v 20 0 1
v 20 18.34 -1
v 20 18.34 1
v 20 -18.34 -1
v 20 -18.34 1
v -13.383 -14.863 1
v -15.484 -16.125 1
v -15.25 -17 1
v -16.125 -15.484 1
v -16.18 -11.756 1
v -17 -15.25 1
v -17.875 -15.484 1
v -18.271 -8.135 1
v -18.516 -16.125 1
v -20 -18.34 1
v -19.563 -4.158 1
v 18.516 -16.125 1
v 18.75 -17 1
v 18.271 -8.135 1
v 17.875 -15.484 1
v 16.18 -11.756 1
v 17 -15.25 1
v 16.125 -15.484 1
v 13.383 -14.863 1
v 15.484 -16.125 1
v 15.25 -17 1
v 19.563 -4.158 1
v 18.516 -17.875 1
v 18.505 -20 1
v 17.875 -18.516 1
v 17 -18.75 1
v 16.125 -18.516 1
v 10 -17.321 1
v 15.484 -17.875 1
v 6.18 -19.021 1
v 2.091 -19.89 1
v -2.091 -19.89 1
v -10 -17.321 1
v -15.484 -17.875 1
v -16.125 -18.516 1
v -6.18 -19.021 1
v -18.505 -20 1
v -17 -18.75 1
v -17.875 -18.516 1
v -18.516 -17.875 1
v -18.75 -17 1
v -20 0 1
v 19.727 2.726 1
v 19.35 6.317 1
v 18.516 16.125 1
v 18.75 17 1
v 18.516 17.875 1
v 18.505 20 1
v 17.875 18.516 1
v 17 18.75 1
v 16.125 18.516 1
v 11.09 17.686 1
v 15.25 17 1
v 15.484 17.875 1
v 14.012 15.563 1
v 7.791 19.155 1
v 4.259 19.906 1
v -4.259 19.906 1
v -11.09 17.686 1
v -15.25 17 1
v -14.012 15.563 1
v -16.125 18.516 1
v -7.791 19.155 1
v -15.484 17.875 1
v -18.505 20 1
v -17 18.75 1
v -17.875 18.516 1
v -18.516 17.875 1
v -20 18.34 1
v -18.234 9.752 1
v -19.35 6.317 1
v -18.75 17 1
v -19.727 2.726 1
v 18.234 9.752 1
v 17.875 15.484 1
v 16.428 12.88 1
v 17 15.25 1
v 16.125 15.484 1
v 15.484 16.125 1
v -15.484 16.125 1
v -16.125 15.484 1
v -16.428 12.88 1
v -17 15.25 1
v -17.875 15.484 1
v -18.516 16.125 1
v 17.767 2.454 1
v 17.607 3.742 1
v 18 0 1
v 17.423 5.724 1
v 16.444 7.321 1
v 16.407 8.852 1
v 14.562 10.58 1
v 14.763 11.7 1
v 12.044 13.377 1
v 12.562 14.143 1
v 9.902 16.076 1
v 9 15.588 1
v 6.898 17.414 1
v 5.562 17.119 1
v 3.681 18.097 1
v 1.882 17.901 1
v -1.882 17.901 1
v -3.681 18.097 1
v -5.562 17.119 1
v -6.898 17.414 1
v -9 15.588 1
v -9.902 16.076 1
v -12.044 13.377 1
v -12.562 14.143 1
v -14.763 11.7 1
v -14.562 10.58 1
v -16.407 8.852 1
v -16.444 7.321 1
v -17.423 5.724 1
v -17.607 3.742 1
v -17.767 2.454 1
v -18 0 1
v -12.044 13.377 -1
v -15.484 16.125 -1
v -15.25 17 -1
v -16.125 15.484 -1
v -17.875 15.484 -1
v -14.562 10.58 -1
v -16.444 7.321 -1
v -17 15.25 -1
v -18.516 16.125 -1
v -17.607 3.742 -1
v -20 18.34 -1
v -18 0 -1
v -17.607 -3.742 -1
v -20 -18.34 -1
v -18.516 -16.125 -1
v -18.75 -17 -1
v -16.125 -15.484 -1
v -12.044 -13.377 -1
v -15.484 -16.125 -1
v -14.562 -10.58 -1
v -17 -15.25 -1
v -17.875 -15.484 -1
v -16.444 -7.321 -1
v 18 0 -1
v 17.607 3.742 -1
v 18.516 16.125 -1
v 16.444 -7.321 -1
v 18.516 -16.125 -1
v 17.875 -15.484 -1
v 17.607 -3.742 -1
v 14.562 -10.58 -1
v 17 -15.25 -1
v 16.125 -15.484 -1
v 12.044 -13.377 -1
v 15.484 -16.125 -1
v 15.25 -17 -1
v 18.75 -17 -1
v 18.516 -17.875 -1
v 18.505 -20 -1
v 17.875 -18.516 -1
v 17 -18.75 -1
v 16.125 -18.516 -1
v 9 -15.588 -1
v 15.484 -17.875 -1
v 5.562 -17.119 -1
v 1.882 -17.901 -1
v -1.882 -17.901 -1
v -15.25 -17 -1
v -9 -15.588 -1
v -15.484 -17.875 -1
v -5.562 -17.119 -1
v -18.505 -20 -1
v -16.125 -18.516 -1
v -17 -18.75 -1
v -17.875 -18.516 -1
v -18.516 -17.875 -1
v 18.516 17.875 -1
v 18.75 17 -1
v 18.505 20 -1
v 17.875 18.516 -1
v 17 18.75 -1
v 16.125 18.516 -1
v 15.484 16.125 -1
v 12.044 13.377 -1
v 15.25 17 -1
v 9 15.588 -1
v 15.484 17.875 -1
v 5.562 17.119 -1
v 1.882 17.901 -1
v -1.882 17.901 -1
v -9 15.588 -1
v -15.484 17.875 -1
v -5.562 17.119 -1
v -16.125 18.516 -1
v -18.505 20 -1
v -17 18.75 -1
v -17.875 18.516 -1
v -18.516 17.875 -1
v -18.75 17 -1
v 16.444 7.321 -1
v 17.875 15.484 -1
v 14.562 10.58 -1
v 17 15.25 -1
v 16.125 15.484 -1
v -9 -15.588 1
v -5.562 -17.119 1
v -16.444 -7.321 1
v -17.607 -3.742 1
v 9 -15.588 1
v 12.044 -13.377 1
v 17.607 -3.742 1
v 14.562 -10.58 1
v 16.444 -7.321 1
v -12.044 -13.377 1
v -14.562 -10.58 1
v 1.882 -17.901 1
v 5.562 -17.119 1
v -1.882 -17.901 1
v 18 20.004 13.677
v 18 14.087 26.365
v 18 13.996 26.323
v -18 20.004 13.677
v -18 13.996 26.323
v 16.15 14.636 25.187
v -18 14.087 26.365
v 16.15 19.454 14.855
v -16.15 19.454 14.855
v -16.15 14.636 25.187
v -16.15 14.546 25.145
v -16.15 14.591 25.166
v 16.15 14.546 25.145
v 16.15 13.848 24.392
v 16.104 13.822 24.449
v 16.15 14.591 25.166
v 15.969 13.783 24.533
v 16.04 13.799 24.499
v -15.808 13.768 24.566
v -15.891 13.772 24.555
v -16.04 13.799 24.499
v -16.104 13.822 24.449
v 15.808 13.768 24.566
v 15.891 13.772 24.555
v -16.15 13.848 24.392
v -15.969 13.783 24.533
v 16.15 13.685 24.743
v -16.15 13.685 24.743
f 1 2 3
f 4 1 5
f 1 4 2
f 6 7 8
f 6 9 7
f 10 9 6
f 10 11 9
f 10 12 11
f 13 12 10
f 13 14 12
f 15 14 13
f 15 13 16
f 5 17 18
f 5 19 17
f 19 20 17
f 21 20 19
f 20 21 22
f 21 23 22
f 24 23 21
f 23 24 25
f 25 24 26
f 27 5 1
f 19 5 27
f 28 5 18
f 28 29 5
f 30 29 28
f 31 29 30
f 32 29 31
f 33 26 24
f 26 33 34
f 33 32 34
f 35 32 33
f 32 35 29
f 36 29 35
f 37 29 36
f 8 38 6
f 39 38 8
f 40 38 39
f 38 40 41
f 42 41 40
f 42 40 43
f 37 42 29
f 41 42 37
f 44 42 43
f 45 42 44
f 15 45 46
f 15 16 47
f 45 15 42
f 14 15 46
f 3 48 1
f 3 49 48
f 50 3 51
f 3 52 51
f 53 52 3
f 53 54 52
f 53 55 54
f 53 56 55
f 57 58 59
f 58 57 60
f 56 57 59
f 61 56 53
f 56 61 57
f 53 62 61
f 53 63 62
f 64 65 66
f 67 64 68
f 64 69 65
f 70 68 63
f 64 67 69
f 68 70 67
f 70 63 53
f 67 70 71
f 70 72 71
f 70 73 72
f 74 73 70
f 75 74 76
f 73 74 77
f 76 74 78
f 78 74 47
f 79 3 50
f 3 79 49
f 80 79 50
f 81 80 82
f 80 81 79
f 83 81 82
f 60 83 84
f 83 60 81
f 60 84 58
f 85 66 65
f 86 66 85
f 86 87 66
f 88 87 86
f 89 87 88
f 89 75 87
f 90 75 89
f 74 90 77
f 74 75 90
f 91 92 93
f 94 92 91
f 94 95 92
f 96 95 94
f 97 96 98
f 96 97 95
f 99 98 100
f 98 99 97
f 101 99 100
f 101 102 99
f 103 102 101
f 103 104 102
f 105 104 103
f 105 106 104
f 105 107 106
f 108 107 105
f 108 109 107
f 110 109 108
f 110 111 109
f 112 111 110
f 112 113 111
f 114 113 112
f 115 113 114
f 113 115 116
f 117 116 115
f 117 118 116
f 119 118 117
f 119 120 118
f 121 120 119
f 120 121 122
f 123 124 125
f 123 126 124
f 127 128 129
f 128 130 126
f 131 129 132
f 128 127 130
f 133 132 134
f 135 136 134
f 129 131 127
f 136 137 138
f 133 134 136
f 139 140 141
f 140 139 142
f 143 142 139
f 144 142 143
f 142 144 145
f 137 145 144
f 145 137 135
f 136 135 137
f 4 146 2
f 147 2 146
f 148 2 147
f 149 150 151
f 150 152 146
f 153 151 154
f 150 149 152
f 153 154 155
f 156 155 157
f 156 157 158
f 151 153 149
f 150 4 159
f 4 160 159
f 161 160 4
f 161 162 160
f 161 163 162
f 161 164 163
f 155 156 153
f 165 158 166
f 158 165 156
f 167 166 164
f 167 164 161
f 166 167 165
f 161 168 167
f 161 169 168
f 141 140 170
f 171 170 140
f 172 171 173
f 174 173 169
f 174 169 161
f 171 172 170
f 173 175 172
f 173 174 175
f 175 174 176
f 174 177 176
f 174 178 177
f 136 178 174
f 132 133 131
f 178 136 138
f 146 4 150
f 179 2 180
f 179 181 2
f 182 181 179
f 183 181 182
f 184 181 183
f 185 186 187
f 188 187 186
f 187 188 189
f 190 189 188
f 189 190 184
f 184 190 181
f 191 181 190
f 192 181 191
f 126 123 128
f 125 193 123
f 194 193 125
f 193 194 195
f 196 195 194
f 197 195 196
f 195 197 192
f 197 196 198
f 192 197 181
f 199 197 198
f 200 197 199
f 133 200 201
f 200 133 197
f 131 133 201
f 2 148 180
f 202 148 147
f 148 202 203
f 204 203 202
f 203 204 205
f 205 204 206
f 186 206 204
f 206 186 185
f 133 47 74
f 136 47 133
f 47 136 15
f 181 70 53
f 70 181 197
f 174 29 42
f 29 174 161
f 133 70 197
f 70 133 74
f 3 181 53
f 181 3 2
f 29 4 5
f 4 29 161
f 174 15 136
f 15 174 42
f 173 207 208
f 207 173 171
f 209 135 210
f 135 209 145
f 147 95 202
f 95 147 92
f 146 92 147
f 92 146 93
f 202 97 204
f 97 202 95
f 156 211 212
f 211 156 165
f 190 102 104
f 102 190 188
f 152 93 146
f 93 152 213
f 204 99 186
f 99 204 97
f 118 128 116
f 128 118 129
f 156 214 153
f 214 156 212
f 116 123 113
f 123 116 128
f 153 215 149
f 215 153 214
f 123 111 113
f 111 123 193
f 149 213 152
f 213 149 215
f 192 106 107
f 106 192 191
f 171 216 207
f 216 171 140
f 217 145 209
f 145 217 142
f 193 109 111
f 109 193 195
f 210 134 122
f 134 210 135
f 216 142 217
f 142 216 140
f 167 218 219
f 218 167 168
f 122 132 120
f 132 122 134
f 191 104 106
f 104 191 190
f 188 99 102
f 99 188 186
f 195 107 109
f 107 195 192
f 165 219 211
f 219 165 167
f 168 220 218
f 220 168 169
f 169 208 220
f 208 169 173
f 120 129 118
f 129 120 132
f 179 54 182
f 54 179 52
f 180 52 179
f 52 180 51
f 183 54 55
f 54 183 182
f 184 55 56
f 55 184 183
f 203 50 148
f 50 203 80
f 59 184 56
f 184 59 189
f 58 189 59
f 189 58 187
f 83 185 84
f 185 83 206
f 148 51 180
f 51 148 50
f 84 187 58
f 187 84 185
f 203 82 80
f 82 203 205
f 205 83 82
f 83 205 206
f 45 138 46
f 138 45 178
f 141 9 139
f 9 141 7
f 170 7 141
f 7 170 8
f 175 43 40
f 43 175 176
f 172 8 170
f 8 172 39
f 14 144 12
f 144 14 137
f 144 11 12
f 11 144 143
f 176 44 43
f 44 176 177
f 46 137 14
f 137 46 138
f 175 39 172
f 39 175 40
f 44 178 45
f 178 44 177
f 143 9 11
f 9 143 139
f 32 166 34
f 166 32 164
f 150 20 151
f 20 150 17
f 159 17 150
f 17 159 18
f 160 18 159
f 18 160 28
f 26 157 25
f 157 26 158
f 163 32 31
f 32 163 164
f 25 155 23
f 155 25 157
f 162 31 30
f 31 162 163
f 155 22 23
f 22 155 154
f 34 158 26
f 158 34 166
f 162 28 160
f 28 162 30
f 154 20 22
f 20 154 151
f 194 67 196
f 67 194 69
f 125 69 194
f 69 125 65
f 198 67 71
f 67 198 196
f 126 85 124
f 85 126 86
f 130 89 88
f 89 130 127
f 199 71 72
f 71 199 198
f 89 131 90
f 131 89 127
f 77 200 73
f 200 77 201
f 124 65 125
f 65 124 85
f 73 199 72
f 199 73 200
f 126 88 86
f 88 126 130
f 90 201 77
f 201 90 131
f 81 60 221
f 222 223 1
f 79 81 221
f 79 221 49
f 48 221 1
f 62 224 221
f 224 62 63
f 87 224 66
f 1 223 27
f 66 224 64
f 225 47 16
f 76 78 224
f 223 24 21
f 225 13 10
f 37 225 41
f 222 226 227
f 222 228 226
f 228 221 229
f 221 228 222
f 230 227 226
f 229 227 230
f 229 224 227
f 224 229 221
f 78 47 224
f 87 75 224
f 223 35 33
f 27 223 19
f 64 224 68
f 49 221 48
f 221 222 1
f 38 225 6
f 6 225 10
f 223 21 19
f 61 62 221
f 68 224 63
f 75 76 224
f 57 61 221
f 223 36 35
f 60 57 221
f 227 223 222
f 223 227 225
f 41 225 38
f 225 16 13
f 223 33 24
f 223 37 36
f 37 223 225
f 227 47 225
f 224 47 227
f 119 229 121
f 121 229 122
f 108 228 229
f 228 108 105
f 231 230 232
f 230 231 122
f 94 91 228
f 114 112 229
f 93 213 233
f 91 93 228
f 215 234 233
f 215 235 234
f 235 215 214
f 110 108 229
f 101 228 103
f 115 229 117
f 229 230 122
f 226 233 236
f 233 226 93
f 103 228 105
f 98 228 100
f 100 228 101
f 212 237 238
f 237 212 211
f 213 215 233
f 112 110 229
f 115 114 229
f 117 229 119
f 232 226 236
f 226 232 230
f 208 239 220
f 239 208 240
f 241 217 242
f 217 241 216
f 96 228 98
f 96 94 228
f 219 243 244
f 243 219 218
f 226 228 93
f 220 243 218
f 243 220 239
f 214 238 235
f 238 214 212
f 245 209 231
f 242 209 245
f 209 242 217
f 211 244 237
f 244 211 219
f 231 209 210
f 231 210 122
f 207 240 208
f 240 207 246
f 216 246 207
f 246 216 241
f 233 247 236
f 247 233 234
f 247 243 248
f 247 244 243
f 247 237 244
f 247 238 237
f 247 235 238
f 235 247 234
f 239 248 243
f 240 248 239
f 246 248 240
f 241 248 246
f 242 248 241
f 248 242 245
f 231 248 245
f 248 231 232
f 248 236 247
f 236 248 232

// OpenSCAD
/* [Base] */

// Base height (mm)
base_height=2;

// Fan body size (mm)
fan_size=40;

// Diameter of the helice hole
fan_hole_diameter=40;



/* [Fixation] */

// Screw diameter (mm)
base_screw_diameter=3.5;

// Margin with border (mm)
base_screw_margin=3;



/* [Duct] */

// Duct shape
duct_shape = "squared"; // [rounded, squared, heart]

// Duct height
duct_height=20;

// Scale over X (% of fan_hole_diameter)
duct_width=.90;
// Scale over Y (% of fan_hole_diameter)
duct_length=.35;

// Hole orientation over X
duct_rotation_x=-65; // [-30:30]
// Hole orientation over Y
duct_rotation_y=0; // [-30:30]
// Hole orientation over Z
duct_rotation_z=0; // [-30:30]

// Distance from center X
duct_delta_x=0;
// Distance from center X
duct_delta_y=17;

// Border thickness
duct_border_width=2;



/* [Hidden] */

// Main Object

//difference() {
union() {
  base();
  duct();
}
/*translate([0, -100, -50])
cube([100, 100, 100]);
}*/

//translate([0, 0, 50]) _duct_top_form_heart();



// build the duct base
module base() {
  difference() {
    _base_form();
    _fan_hole_form(base_height+1, duct_border_width);
    _screw();
  }
}



module _screw() {
  $fn=12;
  // holes Position var
  s_hole=fan_size/2-base_screw_margin;

  translate([s_hole, s_hole, 0])
    cylinder(r=base_screw_diameter/2, h=base_height+2, center=true);
  translate([-s_hole, -s_hole, 0])
    cylinder(r=base_screw_diameter/2, h=base_height+2, center=true);
  translate([s_hole, -s_hole, 0])
    cylinder(r=base_screw_diameter/2, h=base_height+2, center=true);
  translate([-s_hole, s_hole, 0])
    cylinder(r=base_screw_diameter/2, h=base_height+2, center=true);
}



// build the duct
module duct() {
  difference() {
    // outter
    _duct();
    // inner
    _duct(duct_border_width);

    //top hole
      _duct_top_form(2,duct_border_width);

    // bottom hole
    translate([0, 0, -1])
      _fan_hole_form(2, duct_border_width);
  }
}



module _duct(margin=0) {
    hull() {
      // top
      _duct_top_form(0.1, margin);
      // bottom
      _fan_hole_form(base_height, margin);
    }
}



module _duct_top_form(height=0.1, margin=0) {
  translate([duct_delta_x, duct_delta_y, duct_height])
    rotate([duct_rotation_x, duct_rotation_y, duct_rotation_z])
      scale([
      duct_width-(margin/fan_hole_diameter),
      duct_length-(margin/fan_hole_diameter),
       1])

    if (duct_shape == "rounded") {
      _duct_top_form_rounded(height, margin);
    } else if 	(duct_shape == "squared") {
      _duct_top_form_squared(height, margin);
    } else if 	(duct_shape == "heart") {
      _duct_top_form_heart(height, margin);
    }
}



module _duct_top_form_rounded(height=0.1, margin=0) {
      cylinder(r=(fan_hole_diameter-margin)/2, h=height, center=true);
}



module _duct_top_form_squared(height=0.1, margin=0) {
      cube([(fan_hole_diameter-margin), (fan_hole_diameter-margin), height], center=true);
}



module _duct_top_form_heart(height=0.1, margin=0) {
  rotate([0, 0, -45])
    union () {
      cube([(fan_hole_diameter-margin)/2, (fan_hole_diameter-margin)/2, height], center=true);
      translate([-(fan_hole_diameter-margin)/4, 0, 0])
        cylinder(r=(fan_hole_diameter-margin)/4, h=height, center=true);
      translate([0, (fan_hole_diameter-margin)/4, 0])
        cylinder(r=(fan_hole_diameter-margin)/4, h=height, center=true);
    }
}



// get the hole form
module _fan_hole_form(height=base_height, margin=0) {
  intersection() {
    _base_form(height, margin);
    cylinder(r=(fan_hole_diameter)/2-margin, h=height, center=true);
  }
  
}



// get the base form
module _base_form(height=base_height, margin=0) {
  intersection() {
    cube([fan_size-margin, fan_size-margin, height], center=true);
    cylinder(r=sqrt(2*fan_size/2*fan_size/2)-duct_border_width/2, h=height, center=true);
  }
}
